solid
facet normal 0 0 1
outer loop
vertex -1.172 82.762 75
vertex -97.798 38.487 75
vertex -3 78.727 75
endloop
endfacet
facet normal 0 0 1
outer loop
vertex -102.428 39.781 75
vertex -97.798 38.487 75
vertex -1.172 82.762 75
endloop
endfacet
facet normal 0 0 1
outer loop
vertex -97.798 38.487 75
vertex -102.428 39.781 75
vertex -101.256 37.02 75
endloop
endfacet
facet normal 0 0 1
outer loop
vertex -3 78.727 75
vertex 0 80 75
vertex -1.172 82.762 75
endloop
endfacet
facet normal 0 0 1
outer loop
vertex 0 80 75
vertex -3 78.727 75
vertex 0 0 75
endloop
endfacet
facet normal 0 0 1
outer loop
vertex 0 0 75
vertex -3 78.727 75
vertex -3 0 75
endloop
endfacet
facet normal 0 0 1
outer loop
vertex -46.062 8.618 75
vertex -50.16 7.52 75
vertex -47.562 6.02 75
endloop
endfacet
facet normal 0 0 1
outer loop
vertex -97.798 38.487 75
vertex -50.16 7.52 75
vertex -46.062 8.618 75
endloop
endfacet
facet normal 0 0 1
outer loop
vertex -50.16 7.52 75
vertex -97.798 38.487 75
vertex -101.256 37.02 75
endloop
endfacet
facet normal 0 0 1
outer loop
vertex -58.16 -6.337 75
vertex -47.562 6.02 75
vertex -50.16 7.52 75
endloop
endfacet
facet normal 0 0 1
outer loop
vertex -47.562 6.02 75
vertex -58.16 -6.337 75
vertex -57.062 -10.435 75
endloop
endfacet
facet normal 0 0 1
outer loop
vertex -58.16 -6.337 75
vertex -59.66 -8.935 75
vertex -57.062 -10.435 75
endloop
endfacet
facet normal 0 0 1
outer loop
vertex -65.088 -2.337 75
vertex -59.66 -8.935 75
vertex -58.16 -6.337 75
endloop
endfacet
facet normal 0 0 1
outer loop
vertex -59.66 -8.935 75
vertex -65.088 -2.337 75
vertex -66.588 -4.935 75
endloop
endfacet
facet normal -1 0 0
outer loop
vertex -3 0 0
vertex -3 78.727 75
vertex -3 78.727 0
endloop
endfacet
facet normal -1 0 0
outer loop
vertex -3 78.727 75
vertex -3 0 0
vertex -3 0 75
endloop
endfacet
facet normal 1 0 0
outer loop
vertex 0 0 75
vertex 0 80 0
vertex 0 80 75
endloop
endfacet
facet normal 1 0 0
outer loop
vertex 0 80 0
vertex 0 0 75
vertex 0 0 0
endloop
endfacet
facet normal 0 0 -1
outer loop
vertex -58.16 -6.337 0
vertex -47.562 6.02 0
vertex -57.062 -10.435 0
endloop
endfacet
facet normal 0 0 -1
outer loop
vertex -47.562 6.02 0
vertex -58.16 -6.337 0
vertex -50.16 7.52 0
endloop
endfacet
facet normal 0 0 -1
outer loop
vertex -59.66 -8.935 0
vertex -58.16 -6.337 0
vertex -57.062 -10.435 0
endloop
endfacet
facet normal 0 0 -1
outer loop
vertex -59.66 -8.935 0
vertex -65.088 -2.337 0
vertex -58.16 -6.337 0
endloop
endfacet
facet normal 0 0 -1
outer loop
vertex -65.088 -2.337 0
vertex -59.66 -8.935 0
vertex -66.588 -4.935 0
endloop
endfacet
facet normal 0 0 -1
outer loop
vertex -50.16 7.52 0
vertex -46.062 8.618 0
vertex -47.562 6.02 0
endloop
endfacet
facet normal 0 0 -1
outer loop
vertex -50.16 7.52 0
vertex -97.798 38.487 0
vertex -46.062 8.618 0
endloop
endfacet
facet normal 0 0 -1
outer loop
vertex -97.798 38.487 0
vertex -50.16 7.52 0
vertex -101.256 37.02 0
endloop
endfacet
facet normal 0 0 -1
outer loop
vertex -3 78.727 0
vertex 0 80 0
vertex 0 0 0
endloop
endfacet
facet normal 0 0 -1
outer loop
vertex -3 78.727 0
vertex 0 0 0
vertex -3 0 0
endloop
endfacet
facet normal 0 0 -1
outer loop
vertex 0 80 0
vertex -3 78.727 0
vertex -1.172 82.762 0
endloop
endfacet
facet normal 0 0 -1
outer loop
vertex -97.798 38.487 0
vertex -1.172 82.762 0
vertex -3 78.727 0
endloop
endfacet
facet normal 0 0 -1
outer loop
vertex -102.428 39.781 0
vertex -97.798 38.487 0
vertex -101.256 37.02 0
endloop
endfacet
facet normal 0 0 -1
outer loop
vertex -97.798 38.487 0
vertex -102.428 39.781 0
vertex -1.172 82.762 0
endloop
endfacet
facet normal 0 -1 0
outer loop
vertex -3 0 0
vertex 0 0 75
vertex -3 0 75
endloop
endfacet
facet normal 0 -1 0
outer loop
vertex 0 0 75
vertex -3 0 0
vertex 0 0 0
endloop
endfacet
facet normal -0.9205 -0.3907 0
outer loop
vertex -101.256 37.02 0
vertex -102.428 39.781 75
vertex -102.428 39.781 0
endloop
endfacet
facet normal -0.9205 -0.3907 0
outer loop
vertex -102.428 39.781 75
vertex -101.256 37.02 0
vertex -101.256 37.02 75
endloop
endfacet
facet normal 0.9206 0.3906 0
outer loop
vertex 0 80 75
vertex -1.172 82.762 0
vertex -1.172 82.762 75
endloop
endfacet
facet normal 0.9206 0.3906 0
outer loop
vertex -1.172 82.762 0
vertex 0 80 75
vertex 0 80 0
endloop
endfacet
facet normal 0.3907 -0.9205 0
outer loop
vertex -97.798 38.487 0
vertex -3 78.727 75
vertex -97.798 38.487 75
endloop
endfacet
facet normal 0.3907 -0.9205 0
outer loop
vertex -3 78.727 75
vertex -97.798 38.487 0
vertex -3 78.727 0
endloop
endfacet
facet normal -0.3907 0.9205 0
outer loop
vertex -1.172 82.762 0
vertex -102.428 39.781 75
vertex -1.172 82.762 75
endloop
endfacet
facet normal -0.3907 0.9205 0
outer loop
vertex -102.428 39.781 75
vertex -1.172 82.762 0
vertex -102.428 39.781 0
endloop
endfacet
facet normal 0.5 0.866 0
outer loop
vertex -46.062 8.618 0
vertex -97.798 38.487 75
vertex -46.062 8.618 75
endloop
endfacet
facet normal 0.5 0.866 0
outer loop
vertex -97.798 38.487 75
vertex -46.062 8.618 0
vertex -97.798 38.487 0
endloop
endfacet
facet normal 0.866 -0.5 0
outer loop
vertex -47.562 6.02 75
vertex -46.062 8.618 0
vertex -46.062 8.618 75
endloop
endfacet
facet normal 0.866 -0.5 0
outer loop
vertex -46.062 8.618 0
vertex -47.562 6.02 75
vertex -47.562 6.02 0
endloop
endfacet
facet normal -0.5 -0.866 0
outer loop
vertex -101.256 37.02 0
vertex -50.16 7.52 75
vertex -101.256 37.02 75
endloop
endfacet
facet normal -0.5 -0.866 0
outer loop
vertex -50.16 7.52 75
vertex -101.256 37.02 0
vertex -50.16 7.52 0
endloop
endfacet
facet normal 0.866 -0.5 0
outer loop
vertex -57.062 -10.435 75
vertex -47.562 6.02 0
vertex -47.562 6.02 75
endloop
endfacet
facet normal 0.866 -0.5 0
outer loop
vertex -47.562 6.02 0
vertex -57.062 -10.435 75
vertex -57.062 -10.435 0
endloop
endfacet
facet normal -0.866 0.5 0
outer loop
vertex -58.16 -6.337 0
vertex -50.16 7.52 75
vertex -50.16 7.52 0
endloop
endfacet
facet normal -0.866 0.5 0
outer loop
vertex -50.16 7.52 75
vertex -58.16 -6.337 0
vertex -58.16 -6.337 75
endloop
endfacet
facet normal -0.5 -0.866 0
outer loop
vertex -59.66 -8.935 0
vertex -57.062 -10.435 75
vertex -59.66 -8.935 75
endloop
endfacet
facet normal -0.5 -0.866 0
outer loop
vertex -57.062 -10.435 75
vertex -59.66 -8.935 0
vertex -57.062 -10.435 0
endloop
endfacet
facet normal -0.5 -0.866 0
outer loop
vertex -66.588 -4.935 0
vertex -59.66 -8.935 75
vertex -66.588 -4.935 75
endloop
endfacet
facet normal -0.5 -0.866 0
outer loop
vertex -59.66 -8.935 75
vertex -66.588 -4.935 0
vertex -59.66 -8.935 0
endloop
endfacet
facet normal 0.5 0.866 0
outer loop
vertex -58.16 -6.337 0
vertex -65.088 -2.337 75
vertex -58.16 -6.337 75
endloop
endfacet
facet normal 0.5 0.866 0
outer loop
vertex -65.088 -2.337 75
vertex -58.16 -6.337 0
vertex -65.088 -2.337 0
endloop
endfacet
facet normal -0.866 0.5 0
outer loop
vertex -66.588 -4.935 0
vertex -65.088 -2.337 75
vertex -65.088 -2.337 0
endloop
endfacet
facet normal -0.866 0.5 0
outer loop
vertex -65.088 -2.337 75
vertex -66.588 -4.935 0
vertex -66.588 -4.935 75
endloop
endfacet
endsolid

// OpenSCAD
/* [Basic] */
// Lay flat on bed ?
lay_flat = "yes";	//	[yes,no]

// How large is the support
width = 75; // [10:200]
// How long is the base
base_length = 80; // [10:200]
// How long is the back
back_length = 110; // [10:200]
// How long is the front
front_length = 62; // [10:100]
// How much space for the phone (leave some space)
phone_space = 16; // [5:100]

// Incline of the back
back_angle = 23;  // [0:90]

/* [Advanced] */
// How tick is the base
base_tickness = 3; // [1:10]
// How tick is the back
back_thickness = 3; // [1:10]
// How tick is the front
front_thickness = 3; // [1:10]
// How long is the retainer
retainer_length  = 8; // [1:50]
// Incline of the front
front_angle = 37;  // [0:90]

module stand() {
	//	base
	cube([width,base_length,base_tickness]);
	
	//back
	translate([0,base_length,0])
	rotate(back_angle,[1,0,0])
	cube([width,back_thickness,back_length]);
	
	//front
	real_front_angle = front_angle + back_angle;
	front_transY = base_length - sin(back_angle) * back_length;
	front_transZ = cos(back_angle) * back_length;
	translate([0,front_transY, front_transZ])
	rotate(real_front_angle + 180, [1,0,0])
	cube([width,front_length,front_thickness]);
	
	//houder
	h_transY = front_transY - cos(real_front_angle) * (front_length - front_thickness);
	h_transX = cos(back_angle) * back_length - sin(real_front_angle) * (front_length - front_thickness);
	translate([0,h_transY,h_transX]) //-7, 46?
	rotate(real_front_angle + 90,[1,0,0])
	cube([width,phone_space + front_thickness, front_thickness]);
	
	
	//stuff
	s_transY = h_transY - sin(real_front_angle) * (phone_space);
	s_transX = h_transX + cos(real_front_angle) * (phone_space);
	translate([0,s_transY,s_transX]) //-7, 46?
	rotate(real_front_angle,[1,0,0])
	cube([width, retainer_length, front_thickness]);
}
//Render
if(lay_flat == "yes") {
	rotate(270,[0,1,0]) stand();
}else {
	stand();
}
